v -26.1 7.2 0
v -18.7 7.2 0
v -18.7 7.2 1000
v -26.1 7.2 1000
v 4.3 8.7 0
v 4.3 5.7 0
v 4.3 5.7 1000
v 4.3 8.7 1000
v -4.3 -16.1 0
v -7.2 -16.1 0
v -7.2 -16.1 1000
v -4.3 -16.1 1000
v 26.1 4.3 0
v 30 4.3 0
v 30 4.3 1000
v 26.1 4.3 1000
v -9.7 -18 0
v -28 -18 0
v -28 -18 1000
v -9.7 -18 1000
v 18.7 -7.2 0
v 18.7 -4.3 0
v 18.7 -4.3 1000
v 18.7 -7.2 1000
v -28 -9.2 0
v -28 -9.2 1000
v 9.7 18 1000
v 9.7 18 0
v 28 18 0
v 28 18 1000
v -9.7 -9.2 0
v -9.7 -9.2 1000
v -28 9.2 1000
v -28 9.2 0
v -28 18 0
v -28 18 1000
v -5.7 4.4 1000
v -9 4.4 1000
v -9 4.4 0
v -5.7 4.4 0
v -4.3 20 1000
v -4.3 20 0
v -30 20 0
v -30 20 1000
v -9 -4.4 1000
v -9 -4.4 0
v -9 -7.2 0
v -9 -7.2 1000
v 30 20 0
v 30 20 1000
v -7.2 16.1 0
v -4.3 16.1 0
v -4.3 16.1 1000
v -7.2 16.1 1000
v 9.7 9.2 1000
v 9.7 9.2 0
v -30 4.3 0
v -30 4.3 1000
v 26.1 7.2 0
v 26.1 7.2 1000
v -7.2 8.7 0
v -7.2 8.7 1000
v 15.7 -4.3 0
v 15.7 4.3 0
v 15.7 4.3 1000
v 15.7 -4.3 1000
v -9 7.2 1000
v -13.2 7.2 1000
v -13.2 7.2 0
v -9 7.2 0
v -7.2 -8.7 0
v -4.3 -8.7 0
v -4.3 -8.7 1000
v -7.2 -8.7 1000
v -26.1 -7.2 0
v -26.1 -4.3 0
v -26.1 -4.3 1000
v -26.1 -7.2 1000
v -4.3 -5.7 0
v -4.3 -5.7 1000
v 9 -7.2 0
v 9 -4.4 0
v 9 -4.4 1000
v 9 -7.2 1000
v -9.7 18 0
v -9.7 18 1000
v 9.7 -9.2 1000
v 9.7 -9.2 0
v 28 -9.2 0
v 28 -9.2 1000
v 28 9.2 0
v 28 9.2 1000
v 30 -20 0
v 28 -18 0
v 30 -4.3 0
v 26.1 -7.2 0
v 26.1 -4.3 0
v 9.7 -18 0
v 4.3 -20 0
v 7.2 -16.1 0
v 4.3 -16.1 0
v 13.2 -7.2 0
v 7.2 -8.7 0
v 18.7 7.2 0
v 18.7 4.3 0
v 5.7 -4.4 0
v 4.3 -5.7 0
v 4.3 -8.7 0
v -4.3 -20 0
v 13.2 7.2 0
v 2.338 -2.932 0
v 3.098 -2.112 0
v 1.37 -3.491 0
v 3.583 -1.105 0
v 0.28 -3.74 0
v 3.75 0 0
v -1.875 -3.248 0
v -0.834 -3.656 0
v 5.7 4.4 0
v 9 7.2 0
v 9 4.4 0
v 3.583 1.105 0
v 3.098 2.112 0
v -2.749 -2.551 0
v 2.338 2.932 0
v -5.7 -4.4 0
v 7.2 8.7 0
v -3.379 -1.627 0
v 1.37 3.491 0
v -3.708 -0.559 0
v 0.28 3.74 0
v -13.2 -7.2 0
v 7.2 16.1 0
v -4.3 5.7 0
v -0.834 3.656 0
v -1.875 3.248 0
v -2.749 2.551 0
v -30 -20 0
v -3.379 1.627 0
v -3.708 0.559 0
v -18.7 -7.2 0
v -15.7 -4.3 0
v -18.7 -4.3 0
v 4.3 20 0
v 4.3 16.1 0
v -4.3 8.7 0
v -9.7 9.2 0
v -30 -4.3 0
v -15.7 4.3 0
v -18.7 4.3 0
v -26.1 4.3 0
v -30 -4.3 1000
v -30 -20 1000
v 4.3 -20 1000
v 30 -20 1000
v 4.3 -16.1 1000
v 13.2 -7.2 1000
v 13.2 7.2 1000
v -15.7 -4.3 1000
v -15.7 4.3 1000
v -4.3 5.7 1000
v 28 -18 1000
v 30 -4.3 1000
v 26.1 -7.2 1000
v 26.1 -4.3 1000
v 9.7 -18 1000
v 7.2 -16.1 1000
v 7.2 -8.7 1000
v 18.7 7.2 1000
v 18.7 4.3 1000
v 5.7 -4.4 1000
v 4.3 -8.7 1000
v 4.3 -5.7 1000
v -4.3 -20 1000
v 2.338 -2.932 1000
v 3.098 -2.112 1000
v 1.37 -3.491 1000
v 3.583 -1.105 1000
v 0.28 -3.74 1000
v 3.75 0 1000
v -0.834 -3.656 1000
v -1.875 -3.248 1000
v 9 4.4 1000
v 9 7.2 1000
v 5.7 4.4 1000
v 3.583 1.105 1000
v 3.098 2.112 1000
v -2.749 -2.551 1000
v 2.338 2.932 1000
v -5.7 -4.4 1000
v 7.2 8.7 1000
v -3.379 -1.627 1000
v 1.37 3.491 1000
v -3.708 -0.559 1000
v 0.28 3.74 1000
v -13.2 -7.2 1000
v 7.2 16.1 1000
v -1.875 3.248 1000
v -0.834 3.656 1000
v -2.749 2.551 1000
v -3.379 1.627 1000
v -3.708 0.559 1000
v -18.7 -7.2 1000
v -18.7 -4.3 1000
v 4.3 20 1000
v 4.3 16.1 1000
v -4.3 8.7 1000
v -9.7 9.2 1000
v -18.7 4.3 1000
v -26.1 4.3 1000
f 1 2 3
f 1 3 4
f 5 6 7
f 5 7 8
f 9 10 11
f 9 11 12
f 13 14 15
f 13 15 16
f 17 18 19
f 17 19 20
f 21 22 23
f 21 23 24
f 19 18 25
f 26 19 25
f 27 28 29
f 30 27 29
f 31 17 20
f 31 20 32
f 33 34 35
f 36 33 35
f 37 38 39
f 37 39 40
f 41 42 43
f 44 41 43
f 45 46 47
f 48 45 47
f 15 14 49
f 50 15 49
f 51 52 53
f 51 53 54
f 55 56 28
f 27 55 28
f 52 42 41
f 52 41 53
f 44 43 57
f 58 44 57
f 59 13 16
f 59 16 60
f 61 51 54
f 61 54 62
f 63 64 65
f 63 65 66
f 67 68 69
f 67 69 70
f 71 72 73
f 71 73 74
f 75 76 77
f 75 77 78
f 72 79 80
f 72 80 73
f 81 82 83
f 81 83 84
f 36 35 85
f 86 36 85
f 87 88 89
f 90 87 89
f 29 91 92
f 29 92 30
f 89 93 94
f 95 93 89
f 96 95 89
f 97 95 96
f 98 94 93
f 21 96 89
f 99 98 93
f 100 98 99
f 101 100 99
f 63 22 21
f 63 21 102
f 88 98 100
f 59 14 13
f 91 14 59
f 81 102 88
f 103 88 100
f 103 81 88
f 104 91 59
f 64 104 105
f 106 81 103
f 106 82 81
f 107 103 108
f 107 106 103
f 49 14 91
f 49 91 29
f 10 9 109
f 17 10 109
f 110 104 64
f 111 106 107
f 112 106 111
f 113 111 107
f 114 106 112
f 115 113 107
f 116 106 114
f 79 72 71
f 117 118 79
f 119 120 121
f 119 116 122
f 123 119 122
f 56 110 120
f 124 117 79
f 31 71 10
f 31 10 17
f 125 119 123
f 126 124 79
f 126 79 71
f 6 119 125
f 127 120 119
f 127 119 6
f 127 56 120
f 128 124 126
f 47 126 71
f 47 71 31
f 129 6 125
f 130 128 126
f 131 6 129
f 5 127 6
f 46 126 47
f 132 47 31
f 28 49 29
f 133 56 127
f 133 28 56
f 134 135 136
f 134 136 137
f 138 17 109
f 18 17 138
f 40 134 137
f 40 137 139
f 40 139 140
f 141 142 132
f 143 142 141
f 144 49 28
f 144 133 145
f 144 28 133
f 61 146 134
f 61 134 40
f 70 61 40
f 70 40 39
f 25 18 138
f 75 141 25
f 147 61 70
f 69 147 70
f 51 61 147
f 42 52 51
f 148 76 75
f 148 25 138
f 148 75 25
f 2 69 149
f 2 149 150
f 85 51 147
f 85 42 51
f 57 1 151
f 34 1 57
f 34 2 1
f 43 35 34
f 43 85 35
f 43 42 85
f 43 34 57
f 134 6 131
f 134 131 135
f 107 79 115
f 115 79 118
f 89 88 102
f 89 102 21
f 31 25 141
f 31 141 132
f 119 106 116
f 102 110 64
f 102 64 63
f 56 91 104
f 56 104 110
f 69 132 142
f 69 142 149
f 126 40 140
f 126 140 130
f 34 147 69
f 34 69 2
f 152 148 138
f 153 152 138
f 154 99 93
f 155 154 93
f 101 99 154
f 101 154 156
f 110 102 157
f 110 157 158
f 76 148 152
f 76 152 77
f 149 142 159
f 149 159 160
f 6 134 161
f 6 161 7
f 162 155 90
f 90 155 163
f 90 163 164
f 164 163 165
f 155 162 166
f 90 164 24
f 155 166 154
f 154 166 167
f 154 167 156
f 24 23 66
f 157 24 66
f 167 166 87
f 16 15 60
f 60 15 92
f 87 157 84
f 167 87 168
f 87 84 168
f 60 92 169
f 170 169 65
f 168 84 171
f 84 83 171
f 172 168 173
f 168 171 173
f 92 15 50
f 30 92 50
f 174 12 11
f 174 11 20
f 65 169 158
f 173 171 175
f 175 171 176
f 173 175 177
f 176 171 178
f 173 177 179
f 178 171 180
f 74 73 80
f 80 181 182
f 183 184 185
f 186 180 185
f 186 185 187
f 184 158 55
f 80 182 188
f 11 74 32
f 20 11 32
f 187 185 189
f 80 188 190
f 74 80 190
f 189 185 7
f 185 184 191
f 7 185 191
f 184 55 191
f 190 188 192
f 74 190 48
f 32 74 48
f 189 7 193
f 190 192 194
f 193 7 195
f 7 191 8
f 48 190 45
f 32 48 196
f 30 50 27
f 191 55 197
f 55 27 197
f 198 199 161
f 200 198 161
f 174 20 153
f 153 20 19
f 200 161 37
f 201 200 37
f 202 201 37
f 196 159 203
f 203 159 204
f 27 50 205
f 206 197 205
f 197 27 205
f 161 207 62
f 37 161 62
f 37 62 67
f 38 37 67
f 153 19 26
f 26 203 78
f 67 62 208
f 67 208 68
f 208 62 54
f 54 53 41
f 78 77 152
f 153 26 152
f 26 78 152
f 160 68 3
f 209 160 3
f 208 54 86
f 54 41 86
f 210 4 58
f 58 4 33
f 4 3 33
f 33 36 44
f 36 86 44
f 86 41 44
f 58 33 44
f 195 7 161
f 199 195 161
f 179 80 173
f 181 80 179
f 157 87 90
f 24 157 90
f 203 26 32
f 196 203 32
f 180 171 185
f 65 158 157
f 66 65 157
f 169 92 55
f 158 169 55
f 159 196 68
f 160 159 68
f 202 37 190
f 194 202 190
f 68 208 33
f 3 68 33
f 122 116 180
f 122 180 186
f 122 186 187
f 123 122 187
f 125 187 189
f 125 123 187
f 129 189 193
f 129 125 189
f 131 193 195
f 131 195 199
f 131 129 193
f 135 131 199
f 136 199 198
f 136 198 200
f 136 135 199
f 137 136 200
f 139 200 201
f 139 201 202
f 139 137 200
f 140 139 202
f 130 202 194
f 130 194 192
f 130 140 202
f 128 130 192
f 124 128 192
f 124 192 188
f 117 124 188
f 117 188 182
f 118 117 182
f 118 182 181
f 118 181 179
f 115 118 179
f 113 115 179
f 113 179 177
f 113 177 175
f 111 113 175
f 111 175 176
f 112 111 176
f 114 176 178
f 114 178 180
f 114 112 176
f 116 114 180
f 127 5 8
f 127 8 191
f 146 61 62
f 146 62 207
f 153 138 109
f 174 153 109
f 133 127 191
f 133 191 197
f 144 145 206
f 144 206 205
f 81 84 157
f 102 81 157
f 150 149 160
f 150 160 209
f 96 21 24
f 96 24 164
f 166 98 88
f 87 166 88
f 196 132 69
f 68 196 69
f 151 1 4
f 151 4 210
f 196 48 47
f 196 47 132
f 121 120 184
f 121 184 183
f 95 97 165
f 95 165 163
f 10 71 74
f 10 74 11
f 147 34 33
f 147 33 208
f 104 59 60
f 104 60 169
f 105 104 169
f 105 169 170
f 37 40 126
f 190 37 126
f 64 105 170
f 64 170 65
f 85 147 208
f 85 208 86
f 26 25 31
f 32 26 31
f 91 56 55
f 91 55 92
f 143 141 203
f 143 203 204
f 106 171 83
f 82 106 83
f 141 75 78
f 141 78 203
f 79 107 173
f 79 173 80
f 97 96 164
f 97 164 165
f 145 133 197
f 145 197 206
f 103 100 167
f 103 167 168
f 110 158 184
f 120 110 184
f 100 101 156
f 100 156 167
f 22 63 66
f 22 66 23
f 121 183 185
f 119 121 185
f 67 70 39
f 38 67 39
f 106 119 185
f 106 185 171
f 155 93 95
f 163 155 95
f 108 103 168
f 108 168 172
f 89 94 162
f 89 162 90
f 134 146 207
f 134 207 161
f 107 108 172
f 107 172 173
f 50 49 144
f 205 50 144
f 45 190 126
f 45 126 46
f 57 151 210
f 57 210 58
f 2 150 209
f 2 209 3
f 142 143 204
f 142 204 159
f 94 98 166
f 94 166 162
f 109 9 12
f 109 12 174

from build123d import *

# Parameters (mm, degrees)
SKETCH_1_R      = 3.75
SKETCH_1_W      = 18.3
SKETCH_1_H      = 8.8
EXTRUDE_1_DEPTH = 1000


with BuildPart() as part:
    # Эскиз1 → Бобышка-Вытянуть1 (new body)
    with BuildSketch(Plane.XY):
        Polygon((-30, 7.2), (-30, 20), (-7.2, 20), (-4.3, 20), (-4.3, 16.1), (-7.2, 16.1), (-7.2, 8.7), (-4.3, 8.7), (-4.3, 5.7), (4.3, 5.7), (4.3, 8.7), (7.2, 8.7), (7.2, 16.1), (4.3, 16.1), (4.3, 20), (7.2, 20), (30, 20), (30, 7.2), (30, 4.3), (26.1, 4.3), (26.1, 7.2), (18.7, 7.2), (18.7, 4.3), (15.7, 4.3), (15.7, -4.3), (18.7, -4.3), (18.7, -7.2), (26.1, -7.2), (26.1, -4.3), (30, -4.3), (30, -7.2), (30, -20), (7.2, -20), (4.3, -20), (4.3, -16.1), (7.2, -16.1), (7.2, -8.7), (4.3, -8.7), (4.3, -5.7), (-4.3, -5.7), (-4.3, -8.7), (-7.2, -8.7), (-7.2, -16.1), (-4.3, -16.1), (-4.3, -20), (-7.2, -20), (-30, -20), (-30, -7.2), (-30, -4.3), (-26.1, -4.3), (-26.1, -7.2), (-18.7, -7.2), (-18.7, -4.3), (-15.7, -4.3), (-15.7, 4.3), (-18.7, 4.3), (-18.7, 7.2), (-26.1, 7.2), (-26.1, 4.3), (-30, 4.3), align=None)
        Circle(SKETCH_1_R, mode=Mode.SUBTRACT)
        Polygon((-13.2, -7.2), (-13.2, 7.2), (-9, 7.2), (-9, 4.4), (-5.7, 4.4), (-5.7, -4.4), (-9, -4.4), (-9, -7.2), align=None, mode=Mode.SUBTRACT)
        with Locations((-18.85, 13.6)):
            Rectangle(SKETCH_1_W, SKETCH_1_H, mode=Mode.SUBTRACT)
        with Locations((-18.85, -13.6)):
            Rectangle(SKETCH_1_W, SKETCH_1_H, mode=Mode.SUBTRACT)
        with Locations((18.85, -13.6)):
            Rectangle(SKETCH_1_W, SKETCH_1_H, mode=Mode.SUBTRACT)
        Polygon((9, 4.4), (5.7, 4.4), (5.7, -4.4), (9, -4.4), (9, -7.2), (13.2, -7.2), (13.2, 7.2), (9, 7.2), align=None, mode=Mode.SUBTRACT)
        with Locations((18.85, 13.6)):
            Rectangle(SKETCH_1_W, SKETCH_1_H, mode=Mode.SUBTRACT)
    extrude(amount=EXTRUDE_1_DEPTH)


solid = part.part
